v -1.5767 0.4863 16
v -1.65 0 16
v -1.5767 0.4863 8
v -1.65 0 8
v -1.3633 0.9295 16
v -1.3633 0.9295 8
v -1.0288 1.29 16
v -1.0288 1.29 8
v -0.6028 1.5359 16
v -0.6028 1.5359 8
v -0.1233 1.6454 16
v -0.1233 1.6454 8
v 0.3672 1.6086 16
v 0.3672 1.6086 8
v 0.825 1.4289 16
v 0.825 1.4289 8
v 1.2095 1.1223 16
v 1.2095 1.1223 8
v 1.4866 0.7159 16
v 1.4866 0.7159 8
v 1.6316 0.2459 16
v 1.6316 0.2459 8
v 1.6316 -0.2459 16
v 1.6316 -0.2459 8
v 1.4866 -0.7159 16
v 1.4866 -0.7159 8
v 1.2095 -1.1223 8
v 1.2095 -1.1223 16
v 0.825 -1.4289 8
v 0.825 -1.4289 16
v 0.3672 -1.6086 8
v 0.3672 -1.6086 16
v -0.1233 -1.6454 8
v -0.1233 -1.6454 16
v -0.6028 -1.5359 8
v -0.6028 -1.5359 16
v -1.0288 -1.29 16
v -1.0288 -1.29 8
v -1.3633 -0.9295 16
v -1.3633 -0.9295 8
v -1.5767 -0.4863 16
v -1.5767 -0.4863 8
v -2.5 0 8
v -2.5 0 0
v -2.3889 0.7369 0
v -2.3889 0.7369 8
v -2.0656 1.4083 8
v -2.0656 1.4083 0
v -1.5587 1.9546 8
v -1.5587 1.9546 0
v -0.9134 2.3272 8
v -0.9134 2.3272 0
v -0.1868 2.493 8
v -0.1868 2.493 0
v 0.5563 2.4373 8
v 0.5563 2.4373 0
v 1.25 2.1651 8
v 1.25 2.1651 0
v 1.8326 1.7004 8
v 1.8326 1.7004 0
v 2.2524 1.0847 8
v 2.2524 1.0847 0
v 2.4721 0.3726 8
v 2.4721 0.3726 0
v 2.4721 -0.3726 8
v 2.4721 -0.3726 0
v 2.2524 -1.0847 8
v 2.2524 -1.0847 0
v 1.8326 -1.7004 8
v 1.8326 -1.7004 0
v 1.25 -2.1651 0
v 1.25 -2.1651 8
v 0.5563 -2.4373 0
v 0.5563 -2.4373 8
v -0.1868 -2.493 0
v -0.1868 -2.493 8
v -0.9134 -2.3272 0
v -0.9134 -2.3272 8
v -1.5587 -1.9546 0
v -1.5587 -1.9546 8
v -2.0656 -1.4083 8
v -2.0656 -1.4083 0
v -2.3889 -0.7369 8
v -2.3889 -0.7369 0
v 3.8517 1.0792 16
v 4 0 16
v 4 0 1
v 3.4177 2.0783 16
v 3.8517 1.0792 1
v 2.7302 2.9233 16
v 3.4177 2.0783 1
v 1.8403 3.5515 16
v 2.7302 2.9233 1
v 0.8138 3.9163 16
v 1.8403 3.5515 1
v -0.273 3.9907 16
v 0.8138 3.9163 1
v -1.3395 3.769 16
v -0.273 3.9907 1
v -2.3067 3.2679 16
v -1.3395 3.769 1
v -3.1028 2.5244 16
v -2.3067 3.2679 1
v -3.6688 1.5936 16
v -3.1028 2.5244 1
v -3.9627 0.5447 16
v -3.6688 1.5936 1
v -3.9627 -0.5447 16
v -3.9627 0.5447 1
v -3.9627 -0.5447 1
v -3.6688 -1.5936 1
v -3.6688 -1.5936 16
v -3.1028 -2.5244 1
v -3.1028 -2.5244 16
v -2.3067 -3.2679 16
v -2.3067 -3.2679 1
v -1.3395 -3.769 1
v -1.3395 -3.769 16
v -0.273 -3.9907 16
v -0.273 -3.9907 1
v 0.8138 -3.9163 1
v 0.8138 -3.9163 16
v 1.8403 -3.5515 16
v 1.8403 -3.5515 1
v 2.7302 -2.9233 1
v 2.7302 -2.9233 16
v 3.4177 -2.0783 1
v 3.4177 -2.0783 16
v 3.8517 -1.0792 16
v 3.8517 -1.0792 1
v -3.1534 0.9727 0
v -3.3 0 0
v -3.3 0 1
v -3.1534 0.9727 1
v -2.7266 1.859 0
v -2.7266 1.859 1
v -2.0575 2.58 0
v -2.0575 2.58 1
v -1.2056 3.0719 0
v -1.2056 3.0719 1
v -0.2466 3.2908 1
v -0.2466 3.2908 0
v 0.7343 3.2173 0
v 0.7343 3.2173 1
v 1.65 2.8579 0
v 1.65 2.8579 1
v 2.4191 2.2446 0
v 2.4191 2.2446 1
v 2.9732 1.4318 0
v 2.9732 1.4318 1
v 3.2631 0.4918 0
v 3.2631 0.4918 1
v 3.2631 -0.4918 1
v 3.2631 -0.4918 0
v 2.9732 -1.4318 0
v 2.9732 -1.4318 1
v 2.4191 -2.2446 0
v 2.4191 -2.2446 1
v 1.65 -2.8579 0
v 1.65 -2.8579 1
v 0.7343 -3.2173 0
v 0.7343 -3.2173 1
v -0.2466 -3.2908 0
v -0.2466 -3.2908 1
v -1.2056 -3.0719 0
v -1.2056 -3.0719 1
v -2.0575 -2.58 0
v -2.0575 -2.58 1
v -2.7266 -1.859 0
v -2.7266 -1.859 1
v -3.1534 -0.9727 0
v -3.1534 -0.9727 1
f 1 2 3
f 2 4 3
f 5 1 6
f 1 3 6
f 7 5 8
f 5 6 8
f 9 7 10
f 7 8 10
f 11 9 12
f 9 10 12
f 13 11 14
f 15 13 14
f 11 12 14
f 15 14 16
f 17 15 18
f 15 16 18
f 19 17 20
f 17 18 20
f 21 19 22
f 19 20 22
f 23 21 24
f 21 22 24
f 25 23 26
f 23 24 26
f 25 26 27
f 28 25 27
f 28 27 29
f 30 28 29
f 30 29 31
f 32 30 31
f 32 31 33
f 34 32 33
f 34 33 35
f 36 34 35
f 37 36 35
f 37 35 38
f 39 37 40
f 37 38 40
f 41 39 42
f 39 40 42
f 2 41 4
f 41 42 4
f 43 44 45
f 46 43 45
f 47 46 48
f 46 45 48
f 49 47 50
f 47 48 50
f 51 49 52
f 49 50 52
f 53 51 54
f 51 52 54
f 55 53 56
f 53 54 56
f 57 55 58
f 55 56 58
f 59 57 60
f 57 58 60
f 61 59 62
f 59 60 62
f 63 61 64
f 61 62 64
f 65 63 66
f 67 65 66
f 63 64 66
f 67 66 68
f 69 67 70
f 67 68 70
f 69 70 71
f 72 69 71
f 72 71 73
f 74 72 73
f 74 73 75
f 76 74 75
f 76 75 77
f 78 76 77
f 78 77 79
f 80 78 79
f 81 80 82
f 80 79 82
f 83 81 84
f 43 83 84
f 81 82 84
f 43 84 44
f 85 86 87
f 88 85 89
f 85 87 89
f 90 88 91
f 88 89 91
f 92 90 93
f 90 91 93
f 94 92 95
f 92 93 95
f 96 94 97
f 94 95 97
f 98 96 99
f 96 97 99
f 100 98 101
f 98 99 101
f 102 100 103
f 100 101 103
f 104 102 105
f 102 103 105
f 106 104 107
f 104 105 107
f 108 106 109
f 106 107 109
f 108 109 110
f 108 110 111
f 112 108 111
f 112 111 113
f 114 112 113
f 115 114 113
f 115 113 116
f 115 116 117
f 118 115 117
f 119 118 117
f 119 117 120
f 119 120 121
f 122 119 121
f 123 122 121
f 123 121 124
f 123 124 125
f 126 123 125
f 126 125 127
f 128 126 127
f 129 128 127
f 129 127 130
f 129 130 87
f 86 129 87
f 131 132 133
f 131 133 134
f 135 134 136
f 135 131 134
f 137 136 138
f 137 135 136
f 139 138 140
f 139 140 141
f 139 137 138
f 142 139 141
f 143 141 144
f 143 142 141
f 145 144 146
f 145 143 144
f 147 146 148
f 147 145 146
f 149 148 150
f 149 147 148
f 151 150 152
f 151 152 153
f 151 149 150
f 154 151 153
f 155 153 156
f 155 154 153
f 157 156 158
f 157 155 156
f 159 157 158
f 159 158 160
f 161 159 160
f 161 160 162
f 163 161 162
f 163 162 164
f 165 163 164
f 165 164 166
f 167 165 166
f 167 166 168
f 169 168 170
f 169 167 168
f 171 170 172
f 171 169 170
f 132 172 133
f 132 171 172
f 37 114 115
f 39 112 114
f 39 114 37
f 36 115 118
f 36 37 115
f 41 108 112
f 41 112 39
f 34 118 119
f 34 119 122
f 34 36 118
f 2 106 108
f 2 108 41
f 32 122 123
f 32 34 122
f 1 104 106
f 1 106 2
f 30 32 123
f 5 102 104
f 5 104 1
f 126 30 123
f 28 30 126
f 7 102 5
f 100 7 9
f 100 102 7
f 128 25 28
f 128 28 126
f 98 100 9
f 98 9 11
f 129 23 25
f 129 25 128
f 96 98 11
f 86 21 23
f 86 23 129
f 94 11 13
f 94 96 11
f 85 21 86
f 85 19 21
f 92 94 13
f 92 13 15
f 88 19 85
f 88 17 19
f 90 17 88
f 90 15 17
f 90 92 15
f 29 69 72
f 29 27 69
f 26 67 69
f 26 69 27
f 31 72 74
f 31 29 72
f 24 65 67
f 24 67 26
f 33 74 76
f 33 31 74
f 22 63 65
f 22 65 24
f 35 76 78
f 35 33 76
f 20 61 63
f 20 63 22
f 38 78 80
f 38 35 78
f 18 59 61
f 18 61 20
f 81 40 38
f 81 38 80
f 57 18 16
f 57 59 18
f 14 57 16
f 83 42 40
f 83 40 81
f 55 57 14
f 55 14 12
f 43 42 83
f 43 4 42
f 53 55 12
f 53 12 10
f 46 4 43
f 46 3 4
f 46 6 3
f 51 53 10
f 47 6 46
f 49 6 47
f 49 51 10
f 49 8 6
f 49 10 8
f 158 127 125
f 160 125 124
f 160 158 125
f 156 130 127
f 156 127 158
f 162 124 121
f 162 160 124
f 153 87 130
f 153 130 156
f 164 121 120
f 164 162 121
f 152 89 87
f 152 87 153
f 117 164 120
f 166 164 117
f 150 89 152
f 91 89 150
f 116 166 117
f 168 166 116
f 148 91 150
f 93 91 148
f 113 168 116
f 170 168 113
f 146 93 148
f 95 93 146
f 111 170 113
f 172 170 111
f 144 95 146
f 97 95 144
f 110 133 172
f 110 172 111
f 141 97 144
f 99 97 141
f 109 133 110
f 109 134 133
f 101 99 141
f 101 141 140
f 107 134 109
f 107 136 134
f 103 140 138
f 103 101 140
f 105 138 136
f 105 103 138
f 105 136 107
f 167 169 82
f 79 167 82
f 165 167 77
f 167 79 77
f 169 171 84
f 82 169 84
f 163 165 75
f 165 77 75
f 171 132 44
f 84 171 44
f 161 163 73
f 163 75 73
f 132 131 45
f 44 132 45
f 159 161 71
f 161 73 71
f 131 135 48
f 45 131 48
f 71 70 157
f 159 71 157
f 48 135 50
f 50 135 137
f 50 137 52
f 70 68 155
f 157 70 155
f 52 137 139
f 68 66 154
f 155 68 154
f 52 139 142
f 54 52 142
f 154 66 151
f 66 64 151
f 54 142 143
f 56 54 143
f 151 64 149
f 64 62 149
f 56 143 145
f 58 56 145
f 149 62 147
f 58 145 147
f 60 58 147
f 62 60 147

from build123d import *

# Parameters (mm, degrees)
ESQUISSE1_R             = 4
BOSS_EXTRU_1_DEPTH      = 16
TROU_TARAUD_M41_D       = 3.3
TROU_TARAUD_M41_DEPTH   = 8
TROU_TARAUD_M41_TIP     = 0.991420021
ESQUISSE4_R             = 2.5
ENL_V_MAT_EXTRU_1_DEPTH = 8
ESQUISSE5_OUTSIDE_W     = 13.92
ESQUISSE5_OUTSIDE_H     = 13.92
ESQUISSE5_OUTSIDE_R     = 3.3
ENL_V_MAT_EXTRU_2_DEPTH = 1


with BuildPart() as part:
    # Esquisse1 → Boss.-Extru.1 (new body)
    with BuildSketch(Plane.XY):
        Circle(ESQUISSE1_R)
    extrude(amount=BOSS_EXTRU_1_DEPTH)

    # Trou taraudé M41
    with Locations(Plane.XY.offset(16)):
        with Locations((0, 0)):
            Hole(TROU_TARAUD_M41_D / 2, depth=TROU_TARAUD_M41_DEPTH)
            with Locations((0, 0, -(TROU_TARAUD_M41_DEPTH + TROU_TARAUD_M41_TIP / 2))):  # 118° drill point
                Cone(0, TROU_TARAUD_M41_D / 2, TROU_TARAUD_M41_TIP, mode=Mode.SUBTRACT)

    # Esquisse4 → Enlèv. mat.-Extru.1 (cut)
    with BuildSketch(Plane(origin=(0, 0, 0), x_dir=(-1, 0, 0), z_dir=(0, 0, -1))):
        Circle(ESQUISSE4_R)
    extrude(amount=-ENL_V_MAT_EXTRU_1_DEPTH, mode=Mode.SUBTRACT)

    # Esquisse5 outside → Enlèv. mat.-Extru.2 (cut)
    with BuildSketch(Plane(origin=(0, 0, 0), x_dir=(-1, 0, 0), z_dir=(0, 0, -1))):
        Rectangle(ESQUISSE5_OUTSIDE_W, ESQUISSE5_OUTSIDE_H)
        Circle(ESQUISSE5_OUTSIDE_R, mode=Mode.SUBTRACT)
    extrude(amount=-ENL_V_MAT_EXTRU_2_DEPTH, mode=Mode.SUBTRACT)


solid = part.part
